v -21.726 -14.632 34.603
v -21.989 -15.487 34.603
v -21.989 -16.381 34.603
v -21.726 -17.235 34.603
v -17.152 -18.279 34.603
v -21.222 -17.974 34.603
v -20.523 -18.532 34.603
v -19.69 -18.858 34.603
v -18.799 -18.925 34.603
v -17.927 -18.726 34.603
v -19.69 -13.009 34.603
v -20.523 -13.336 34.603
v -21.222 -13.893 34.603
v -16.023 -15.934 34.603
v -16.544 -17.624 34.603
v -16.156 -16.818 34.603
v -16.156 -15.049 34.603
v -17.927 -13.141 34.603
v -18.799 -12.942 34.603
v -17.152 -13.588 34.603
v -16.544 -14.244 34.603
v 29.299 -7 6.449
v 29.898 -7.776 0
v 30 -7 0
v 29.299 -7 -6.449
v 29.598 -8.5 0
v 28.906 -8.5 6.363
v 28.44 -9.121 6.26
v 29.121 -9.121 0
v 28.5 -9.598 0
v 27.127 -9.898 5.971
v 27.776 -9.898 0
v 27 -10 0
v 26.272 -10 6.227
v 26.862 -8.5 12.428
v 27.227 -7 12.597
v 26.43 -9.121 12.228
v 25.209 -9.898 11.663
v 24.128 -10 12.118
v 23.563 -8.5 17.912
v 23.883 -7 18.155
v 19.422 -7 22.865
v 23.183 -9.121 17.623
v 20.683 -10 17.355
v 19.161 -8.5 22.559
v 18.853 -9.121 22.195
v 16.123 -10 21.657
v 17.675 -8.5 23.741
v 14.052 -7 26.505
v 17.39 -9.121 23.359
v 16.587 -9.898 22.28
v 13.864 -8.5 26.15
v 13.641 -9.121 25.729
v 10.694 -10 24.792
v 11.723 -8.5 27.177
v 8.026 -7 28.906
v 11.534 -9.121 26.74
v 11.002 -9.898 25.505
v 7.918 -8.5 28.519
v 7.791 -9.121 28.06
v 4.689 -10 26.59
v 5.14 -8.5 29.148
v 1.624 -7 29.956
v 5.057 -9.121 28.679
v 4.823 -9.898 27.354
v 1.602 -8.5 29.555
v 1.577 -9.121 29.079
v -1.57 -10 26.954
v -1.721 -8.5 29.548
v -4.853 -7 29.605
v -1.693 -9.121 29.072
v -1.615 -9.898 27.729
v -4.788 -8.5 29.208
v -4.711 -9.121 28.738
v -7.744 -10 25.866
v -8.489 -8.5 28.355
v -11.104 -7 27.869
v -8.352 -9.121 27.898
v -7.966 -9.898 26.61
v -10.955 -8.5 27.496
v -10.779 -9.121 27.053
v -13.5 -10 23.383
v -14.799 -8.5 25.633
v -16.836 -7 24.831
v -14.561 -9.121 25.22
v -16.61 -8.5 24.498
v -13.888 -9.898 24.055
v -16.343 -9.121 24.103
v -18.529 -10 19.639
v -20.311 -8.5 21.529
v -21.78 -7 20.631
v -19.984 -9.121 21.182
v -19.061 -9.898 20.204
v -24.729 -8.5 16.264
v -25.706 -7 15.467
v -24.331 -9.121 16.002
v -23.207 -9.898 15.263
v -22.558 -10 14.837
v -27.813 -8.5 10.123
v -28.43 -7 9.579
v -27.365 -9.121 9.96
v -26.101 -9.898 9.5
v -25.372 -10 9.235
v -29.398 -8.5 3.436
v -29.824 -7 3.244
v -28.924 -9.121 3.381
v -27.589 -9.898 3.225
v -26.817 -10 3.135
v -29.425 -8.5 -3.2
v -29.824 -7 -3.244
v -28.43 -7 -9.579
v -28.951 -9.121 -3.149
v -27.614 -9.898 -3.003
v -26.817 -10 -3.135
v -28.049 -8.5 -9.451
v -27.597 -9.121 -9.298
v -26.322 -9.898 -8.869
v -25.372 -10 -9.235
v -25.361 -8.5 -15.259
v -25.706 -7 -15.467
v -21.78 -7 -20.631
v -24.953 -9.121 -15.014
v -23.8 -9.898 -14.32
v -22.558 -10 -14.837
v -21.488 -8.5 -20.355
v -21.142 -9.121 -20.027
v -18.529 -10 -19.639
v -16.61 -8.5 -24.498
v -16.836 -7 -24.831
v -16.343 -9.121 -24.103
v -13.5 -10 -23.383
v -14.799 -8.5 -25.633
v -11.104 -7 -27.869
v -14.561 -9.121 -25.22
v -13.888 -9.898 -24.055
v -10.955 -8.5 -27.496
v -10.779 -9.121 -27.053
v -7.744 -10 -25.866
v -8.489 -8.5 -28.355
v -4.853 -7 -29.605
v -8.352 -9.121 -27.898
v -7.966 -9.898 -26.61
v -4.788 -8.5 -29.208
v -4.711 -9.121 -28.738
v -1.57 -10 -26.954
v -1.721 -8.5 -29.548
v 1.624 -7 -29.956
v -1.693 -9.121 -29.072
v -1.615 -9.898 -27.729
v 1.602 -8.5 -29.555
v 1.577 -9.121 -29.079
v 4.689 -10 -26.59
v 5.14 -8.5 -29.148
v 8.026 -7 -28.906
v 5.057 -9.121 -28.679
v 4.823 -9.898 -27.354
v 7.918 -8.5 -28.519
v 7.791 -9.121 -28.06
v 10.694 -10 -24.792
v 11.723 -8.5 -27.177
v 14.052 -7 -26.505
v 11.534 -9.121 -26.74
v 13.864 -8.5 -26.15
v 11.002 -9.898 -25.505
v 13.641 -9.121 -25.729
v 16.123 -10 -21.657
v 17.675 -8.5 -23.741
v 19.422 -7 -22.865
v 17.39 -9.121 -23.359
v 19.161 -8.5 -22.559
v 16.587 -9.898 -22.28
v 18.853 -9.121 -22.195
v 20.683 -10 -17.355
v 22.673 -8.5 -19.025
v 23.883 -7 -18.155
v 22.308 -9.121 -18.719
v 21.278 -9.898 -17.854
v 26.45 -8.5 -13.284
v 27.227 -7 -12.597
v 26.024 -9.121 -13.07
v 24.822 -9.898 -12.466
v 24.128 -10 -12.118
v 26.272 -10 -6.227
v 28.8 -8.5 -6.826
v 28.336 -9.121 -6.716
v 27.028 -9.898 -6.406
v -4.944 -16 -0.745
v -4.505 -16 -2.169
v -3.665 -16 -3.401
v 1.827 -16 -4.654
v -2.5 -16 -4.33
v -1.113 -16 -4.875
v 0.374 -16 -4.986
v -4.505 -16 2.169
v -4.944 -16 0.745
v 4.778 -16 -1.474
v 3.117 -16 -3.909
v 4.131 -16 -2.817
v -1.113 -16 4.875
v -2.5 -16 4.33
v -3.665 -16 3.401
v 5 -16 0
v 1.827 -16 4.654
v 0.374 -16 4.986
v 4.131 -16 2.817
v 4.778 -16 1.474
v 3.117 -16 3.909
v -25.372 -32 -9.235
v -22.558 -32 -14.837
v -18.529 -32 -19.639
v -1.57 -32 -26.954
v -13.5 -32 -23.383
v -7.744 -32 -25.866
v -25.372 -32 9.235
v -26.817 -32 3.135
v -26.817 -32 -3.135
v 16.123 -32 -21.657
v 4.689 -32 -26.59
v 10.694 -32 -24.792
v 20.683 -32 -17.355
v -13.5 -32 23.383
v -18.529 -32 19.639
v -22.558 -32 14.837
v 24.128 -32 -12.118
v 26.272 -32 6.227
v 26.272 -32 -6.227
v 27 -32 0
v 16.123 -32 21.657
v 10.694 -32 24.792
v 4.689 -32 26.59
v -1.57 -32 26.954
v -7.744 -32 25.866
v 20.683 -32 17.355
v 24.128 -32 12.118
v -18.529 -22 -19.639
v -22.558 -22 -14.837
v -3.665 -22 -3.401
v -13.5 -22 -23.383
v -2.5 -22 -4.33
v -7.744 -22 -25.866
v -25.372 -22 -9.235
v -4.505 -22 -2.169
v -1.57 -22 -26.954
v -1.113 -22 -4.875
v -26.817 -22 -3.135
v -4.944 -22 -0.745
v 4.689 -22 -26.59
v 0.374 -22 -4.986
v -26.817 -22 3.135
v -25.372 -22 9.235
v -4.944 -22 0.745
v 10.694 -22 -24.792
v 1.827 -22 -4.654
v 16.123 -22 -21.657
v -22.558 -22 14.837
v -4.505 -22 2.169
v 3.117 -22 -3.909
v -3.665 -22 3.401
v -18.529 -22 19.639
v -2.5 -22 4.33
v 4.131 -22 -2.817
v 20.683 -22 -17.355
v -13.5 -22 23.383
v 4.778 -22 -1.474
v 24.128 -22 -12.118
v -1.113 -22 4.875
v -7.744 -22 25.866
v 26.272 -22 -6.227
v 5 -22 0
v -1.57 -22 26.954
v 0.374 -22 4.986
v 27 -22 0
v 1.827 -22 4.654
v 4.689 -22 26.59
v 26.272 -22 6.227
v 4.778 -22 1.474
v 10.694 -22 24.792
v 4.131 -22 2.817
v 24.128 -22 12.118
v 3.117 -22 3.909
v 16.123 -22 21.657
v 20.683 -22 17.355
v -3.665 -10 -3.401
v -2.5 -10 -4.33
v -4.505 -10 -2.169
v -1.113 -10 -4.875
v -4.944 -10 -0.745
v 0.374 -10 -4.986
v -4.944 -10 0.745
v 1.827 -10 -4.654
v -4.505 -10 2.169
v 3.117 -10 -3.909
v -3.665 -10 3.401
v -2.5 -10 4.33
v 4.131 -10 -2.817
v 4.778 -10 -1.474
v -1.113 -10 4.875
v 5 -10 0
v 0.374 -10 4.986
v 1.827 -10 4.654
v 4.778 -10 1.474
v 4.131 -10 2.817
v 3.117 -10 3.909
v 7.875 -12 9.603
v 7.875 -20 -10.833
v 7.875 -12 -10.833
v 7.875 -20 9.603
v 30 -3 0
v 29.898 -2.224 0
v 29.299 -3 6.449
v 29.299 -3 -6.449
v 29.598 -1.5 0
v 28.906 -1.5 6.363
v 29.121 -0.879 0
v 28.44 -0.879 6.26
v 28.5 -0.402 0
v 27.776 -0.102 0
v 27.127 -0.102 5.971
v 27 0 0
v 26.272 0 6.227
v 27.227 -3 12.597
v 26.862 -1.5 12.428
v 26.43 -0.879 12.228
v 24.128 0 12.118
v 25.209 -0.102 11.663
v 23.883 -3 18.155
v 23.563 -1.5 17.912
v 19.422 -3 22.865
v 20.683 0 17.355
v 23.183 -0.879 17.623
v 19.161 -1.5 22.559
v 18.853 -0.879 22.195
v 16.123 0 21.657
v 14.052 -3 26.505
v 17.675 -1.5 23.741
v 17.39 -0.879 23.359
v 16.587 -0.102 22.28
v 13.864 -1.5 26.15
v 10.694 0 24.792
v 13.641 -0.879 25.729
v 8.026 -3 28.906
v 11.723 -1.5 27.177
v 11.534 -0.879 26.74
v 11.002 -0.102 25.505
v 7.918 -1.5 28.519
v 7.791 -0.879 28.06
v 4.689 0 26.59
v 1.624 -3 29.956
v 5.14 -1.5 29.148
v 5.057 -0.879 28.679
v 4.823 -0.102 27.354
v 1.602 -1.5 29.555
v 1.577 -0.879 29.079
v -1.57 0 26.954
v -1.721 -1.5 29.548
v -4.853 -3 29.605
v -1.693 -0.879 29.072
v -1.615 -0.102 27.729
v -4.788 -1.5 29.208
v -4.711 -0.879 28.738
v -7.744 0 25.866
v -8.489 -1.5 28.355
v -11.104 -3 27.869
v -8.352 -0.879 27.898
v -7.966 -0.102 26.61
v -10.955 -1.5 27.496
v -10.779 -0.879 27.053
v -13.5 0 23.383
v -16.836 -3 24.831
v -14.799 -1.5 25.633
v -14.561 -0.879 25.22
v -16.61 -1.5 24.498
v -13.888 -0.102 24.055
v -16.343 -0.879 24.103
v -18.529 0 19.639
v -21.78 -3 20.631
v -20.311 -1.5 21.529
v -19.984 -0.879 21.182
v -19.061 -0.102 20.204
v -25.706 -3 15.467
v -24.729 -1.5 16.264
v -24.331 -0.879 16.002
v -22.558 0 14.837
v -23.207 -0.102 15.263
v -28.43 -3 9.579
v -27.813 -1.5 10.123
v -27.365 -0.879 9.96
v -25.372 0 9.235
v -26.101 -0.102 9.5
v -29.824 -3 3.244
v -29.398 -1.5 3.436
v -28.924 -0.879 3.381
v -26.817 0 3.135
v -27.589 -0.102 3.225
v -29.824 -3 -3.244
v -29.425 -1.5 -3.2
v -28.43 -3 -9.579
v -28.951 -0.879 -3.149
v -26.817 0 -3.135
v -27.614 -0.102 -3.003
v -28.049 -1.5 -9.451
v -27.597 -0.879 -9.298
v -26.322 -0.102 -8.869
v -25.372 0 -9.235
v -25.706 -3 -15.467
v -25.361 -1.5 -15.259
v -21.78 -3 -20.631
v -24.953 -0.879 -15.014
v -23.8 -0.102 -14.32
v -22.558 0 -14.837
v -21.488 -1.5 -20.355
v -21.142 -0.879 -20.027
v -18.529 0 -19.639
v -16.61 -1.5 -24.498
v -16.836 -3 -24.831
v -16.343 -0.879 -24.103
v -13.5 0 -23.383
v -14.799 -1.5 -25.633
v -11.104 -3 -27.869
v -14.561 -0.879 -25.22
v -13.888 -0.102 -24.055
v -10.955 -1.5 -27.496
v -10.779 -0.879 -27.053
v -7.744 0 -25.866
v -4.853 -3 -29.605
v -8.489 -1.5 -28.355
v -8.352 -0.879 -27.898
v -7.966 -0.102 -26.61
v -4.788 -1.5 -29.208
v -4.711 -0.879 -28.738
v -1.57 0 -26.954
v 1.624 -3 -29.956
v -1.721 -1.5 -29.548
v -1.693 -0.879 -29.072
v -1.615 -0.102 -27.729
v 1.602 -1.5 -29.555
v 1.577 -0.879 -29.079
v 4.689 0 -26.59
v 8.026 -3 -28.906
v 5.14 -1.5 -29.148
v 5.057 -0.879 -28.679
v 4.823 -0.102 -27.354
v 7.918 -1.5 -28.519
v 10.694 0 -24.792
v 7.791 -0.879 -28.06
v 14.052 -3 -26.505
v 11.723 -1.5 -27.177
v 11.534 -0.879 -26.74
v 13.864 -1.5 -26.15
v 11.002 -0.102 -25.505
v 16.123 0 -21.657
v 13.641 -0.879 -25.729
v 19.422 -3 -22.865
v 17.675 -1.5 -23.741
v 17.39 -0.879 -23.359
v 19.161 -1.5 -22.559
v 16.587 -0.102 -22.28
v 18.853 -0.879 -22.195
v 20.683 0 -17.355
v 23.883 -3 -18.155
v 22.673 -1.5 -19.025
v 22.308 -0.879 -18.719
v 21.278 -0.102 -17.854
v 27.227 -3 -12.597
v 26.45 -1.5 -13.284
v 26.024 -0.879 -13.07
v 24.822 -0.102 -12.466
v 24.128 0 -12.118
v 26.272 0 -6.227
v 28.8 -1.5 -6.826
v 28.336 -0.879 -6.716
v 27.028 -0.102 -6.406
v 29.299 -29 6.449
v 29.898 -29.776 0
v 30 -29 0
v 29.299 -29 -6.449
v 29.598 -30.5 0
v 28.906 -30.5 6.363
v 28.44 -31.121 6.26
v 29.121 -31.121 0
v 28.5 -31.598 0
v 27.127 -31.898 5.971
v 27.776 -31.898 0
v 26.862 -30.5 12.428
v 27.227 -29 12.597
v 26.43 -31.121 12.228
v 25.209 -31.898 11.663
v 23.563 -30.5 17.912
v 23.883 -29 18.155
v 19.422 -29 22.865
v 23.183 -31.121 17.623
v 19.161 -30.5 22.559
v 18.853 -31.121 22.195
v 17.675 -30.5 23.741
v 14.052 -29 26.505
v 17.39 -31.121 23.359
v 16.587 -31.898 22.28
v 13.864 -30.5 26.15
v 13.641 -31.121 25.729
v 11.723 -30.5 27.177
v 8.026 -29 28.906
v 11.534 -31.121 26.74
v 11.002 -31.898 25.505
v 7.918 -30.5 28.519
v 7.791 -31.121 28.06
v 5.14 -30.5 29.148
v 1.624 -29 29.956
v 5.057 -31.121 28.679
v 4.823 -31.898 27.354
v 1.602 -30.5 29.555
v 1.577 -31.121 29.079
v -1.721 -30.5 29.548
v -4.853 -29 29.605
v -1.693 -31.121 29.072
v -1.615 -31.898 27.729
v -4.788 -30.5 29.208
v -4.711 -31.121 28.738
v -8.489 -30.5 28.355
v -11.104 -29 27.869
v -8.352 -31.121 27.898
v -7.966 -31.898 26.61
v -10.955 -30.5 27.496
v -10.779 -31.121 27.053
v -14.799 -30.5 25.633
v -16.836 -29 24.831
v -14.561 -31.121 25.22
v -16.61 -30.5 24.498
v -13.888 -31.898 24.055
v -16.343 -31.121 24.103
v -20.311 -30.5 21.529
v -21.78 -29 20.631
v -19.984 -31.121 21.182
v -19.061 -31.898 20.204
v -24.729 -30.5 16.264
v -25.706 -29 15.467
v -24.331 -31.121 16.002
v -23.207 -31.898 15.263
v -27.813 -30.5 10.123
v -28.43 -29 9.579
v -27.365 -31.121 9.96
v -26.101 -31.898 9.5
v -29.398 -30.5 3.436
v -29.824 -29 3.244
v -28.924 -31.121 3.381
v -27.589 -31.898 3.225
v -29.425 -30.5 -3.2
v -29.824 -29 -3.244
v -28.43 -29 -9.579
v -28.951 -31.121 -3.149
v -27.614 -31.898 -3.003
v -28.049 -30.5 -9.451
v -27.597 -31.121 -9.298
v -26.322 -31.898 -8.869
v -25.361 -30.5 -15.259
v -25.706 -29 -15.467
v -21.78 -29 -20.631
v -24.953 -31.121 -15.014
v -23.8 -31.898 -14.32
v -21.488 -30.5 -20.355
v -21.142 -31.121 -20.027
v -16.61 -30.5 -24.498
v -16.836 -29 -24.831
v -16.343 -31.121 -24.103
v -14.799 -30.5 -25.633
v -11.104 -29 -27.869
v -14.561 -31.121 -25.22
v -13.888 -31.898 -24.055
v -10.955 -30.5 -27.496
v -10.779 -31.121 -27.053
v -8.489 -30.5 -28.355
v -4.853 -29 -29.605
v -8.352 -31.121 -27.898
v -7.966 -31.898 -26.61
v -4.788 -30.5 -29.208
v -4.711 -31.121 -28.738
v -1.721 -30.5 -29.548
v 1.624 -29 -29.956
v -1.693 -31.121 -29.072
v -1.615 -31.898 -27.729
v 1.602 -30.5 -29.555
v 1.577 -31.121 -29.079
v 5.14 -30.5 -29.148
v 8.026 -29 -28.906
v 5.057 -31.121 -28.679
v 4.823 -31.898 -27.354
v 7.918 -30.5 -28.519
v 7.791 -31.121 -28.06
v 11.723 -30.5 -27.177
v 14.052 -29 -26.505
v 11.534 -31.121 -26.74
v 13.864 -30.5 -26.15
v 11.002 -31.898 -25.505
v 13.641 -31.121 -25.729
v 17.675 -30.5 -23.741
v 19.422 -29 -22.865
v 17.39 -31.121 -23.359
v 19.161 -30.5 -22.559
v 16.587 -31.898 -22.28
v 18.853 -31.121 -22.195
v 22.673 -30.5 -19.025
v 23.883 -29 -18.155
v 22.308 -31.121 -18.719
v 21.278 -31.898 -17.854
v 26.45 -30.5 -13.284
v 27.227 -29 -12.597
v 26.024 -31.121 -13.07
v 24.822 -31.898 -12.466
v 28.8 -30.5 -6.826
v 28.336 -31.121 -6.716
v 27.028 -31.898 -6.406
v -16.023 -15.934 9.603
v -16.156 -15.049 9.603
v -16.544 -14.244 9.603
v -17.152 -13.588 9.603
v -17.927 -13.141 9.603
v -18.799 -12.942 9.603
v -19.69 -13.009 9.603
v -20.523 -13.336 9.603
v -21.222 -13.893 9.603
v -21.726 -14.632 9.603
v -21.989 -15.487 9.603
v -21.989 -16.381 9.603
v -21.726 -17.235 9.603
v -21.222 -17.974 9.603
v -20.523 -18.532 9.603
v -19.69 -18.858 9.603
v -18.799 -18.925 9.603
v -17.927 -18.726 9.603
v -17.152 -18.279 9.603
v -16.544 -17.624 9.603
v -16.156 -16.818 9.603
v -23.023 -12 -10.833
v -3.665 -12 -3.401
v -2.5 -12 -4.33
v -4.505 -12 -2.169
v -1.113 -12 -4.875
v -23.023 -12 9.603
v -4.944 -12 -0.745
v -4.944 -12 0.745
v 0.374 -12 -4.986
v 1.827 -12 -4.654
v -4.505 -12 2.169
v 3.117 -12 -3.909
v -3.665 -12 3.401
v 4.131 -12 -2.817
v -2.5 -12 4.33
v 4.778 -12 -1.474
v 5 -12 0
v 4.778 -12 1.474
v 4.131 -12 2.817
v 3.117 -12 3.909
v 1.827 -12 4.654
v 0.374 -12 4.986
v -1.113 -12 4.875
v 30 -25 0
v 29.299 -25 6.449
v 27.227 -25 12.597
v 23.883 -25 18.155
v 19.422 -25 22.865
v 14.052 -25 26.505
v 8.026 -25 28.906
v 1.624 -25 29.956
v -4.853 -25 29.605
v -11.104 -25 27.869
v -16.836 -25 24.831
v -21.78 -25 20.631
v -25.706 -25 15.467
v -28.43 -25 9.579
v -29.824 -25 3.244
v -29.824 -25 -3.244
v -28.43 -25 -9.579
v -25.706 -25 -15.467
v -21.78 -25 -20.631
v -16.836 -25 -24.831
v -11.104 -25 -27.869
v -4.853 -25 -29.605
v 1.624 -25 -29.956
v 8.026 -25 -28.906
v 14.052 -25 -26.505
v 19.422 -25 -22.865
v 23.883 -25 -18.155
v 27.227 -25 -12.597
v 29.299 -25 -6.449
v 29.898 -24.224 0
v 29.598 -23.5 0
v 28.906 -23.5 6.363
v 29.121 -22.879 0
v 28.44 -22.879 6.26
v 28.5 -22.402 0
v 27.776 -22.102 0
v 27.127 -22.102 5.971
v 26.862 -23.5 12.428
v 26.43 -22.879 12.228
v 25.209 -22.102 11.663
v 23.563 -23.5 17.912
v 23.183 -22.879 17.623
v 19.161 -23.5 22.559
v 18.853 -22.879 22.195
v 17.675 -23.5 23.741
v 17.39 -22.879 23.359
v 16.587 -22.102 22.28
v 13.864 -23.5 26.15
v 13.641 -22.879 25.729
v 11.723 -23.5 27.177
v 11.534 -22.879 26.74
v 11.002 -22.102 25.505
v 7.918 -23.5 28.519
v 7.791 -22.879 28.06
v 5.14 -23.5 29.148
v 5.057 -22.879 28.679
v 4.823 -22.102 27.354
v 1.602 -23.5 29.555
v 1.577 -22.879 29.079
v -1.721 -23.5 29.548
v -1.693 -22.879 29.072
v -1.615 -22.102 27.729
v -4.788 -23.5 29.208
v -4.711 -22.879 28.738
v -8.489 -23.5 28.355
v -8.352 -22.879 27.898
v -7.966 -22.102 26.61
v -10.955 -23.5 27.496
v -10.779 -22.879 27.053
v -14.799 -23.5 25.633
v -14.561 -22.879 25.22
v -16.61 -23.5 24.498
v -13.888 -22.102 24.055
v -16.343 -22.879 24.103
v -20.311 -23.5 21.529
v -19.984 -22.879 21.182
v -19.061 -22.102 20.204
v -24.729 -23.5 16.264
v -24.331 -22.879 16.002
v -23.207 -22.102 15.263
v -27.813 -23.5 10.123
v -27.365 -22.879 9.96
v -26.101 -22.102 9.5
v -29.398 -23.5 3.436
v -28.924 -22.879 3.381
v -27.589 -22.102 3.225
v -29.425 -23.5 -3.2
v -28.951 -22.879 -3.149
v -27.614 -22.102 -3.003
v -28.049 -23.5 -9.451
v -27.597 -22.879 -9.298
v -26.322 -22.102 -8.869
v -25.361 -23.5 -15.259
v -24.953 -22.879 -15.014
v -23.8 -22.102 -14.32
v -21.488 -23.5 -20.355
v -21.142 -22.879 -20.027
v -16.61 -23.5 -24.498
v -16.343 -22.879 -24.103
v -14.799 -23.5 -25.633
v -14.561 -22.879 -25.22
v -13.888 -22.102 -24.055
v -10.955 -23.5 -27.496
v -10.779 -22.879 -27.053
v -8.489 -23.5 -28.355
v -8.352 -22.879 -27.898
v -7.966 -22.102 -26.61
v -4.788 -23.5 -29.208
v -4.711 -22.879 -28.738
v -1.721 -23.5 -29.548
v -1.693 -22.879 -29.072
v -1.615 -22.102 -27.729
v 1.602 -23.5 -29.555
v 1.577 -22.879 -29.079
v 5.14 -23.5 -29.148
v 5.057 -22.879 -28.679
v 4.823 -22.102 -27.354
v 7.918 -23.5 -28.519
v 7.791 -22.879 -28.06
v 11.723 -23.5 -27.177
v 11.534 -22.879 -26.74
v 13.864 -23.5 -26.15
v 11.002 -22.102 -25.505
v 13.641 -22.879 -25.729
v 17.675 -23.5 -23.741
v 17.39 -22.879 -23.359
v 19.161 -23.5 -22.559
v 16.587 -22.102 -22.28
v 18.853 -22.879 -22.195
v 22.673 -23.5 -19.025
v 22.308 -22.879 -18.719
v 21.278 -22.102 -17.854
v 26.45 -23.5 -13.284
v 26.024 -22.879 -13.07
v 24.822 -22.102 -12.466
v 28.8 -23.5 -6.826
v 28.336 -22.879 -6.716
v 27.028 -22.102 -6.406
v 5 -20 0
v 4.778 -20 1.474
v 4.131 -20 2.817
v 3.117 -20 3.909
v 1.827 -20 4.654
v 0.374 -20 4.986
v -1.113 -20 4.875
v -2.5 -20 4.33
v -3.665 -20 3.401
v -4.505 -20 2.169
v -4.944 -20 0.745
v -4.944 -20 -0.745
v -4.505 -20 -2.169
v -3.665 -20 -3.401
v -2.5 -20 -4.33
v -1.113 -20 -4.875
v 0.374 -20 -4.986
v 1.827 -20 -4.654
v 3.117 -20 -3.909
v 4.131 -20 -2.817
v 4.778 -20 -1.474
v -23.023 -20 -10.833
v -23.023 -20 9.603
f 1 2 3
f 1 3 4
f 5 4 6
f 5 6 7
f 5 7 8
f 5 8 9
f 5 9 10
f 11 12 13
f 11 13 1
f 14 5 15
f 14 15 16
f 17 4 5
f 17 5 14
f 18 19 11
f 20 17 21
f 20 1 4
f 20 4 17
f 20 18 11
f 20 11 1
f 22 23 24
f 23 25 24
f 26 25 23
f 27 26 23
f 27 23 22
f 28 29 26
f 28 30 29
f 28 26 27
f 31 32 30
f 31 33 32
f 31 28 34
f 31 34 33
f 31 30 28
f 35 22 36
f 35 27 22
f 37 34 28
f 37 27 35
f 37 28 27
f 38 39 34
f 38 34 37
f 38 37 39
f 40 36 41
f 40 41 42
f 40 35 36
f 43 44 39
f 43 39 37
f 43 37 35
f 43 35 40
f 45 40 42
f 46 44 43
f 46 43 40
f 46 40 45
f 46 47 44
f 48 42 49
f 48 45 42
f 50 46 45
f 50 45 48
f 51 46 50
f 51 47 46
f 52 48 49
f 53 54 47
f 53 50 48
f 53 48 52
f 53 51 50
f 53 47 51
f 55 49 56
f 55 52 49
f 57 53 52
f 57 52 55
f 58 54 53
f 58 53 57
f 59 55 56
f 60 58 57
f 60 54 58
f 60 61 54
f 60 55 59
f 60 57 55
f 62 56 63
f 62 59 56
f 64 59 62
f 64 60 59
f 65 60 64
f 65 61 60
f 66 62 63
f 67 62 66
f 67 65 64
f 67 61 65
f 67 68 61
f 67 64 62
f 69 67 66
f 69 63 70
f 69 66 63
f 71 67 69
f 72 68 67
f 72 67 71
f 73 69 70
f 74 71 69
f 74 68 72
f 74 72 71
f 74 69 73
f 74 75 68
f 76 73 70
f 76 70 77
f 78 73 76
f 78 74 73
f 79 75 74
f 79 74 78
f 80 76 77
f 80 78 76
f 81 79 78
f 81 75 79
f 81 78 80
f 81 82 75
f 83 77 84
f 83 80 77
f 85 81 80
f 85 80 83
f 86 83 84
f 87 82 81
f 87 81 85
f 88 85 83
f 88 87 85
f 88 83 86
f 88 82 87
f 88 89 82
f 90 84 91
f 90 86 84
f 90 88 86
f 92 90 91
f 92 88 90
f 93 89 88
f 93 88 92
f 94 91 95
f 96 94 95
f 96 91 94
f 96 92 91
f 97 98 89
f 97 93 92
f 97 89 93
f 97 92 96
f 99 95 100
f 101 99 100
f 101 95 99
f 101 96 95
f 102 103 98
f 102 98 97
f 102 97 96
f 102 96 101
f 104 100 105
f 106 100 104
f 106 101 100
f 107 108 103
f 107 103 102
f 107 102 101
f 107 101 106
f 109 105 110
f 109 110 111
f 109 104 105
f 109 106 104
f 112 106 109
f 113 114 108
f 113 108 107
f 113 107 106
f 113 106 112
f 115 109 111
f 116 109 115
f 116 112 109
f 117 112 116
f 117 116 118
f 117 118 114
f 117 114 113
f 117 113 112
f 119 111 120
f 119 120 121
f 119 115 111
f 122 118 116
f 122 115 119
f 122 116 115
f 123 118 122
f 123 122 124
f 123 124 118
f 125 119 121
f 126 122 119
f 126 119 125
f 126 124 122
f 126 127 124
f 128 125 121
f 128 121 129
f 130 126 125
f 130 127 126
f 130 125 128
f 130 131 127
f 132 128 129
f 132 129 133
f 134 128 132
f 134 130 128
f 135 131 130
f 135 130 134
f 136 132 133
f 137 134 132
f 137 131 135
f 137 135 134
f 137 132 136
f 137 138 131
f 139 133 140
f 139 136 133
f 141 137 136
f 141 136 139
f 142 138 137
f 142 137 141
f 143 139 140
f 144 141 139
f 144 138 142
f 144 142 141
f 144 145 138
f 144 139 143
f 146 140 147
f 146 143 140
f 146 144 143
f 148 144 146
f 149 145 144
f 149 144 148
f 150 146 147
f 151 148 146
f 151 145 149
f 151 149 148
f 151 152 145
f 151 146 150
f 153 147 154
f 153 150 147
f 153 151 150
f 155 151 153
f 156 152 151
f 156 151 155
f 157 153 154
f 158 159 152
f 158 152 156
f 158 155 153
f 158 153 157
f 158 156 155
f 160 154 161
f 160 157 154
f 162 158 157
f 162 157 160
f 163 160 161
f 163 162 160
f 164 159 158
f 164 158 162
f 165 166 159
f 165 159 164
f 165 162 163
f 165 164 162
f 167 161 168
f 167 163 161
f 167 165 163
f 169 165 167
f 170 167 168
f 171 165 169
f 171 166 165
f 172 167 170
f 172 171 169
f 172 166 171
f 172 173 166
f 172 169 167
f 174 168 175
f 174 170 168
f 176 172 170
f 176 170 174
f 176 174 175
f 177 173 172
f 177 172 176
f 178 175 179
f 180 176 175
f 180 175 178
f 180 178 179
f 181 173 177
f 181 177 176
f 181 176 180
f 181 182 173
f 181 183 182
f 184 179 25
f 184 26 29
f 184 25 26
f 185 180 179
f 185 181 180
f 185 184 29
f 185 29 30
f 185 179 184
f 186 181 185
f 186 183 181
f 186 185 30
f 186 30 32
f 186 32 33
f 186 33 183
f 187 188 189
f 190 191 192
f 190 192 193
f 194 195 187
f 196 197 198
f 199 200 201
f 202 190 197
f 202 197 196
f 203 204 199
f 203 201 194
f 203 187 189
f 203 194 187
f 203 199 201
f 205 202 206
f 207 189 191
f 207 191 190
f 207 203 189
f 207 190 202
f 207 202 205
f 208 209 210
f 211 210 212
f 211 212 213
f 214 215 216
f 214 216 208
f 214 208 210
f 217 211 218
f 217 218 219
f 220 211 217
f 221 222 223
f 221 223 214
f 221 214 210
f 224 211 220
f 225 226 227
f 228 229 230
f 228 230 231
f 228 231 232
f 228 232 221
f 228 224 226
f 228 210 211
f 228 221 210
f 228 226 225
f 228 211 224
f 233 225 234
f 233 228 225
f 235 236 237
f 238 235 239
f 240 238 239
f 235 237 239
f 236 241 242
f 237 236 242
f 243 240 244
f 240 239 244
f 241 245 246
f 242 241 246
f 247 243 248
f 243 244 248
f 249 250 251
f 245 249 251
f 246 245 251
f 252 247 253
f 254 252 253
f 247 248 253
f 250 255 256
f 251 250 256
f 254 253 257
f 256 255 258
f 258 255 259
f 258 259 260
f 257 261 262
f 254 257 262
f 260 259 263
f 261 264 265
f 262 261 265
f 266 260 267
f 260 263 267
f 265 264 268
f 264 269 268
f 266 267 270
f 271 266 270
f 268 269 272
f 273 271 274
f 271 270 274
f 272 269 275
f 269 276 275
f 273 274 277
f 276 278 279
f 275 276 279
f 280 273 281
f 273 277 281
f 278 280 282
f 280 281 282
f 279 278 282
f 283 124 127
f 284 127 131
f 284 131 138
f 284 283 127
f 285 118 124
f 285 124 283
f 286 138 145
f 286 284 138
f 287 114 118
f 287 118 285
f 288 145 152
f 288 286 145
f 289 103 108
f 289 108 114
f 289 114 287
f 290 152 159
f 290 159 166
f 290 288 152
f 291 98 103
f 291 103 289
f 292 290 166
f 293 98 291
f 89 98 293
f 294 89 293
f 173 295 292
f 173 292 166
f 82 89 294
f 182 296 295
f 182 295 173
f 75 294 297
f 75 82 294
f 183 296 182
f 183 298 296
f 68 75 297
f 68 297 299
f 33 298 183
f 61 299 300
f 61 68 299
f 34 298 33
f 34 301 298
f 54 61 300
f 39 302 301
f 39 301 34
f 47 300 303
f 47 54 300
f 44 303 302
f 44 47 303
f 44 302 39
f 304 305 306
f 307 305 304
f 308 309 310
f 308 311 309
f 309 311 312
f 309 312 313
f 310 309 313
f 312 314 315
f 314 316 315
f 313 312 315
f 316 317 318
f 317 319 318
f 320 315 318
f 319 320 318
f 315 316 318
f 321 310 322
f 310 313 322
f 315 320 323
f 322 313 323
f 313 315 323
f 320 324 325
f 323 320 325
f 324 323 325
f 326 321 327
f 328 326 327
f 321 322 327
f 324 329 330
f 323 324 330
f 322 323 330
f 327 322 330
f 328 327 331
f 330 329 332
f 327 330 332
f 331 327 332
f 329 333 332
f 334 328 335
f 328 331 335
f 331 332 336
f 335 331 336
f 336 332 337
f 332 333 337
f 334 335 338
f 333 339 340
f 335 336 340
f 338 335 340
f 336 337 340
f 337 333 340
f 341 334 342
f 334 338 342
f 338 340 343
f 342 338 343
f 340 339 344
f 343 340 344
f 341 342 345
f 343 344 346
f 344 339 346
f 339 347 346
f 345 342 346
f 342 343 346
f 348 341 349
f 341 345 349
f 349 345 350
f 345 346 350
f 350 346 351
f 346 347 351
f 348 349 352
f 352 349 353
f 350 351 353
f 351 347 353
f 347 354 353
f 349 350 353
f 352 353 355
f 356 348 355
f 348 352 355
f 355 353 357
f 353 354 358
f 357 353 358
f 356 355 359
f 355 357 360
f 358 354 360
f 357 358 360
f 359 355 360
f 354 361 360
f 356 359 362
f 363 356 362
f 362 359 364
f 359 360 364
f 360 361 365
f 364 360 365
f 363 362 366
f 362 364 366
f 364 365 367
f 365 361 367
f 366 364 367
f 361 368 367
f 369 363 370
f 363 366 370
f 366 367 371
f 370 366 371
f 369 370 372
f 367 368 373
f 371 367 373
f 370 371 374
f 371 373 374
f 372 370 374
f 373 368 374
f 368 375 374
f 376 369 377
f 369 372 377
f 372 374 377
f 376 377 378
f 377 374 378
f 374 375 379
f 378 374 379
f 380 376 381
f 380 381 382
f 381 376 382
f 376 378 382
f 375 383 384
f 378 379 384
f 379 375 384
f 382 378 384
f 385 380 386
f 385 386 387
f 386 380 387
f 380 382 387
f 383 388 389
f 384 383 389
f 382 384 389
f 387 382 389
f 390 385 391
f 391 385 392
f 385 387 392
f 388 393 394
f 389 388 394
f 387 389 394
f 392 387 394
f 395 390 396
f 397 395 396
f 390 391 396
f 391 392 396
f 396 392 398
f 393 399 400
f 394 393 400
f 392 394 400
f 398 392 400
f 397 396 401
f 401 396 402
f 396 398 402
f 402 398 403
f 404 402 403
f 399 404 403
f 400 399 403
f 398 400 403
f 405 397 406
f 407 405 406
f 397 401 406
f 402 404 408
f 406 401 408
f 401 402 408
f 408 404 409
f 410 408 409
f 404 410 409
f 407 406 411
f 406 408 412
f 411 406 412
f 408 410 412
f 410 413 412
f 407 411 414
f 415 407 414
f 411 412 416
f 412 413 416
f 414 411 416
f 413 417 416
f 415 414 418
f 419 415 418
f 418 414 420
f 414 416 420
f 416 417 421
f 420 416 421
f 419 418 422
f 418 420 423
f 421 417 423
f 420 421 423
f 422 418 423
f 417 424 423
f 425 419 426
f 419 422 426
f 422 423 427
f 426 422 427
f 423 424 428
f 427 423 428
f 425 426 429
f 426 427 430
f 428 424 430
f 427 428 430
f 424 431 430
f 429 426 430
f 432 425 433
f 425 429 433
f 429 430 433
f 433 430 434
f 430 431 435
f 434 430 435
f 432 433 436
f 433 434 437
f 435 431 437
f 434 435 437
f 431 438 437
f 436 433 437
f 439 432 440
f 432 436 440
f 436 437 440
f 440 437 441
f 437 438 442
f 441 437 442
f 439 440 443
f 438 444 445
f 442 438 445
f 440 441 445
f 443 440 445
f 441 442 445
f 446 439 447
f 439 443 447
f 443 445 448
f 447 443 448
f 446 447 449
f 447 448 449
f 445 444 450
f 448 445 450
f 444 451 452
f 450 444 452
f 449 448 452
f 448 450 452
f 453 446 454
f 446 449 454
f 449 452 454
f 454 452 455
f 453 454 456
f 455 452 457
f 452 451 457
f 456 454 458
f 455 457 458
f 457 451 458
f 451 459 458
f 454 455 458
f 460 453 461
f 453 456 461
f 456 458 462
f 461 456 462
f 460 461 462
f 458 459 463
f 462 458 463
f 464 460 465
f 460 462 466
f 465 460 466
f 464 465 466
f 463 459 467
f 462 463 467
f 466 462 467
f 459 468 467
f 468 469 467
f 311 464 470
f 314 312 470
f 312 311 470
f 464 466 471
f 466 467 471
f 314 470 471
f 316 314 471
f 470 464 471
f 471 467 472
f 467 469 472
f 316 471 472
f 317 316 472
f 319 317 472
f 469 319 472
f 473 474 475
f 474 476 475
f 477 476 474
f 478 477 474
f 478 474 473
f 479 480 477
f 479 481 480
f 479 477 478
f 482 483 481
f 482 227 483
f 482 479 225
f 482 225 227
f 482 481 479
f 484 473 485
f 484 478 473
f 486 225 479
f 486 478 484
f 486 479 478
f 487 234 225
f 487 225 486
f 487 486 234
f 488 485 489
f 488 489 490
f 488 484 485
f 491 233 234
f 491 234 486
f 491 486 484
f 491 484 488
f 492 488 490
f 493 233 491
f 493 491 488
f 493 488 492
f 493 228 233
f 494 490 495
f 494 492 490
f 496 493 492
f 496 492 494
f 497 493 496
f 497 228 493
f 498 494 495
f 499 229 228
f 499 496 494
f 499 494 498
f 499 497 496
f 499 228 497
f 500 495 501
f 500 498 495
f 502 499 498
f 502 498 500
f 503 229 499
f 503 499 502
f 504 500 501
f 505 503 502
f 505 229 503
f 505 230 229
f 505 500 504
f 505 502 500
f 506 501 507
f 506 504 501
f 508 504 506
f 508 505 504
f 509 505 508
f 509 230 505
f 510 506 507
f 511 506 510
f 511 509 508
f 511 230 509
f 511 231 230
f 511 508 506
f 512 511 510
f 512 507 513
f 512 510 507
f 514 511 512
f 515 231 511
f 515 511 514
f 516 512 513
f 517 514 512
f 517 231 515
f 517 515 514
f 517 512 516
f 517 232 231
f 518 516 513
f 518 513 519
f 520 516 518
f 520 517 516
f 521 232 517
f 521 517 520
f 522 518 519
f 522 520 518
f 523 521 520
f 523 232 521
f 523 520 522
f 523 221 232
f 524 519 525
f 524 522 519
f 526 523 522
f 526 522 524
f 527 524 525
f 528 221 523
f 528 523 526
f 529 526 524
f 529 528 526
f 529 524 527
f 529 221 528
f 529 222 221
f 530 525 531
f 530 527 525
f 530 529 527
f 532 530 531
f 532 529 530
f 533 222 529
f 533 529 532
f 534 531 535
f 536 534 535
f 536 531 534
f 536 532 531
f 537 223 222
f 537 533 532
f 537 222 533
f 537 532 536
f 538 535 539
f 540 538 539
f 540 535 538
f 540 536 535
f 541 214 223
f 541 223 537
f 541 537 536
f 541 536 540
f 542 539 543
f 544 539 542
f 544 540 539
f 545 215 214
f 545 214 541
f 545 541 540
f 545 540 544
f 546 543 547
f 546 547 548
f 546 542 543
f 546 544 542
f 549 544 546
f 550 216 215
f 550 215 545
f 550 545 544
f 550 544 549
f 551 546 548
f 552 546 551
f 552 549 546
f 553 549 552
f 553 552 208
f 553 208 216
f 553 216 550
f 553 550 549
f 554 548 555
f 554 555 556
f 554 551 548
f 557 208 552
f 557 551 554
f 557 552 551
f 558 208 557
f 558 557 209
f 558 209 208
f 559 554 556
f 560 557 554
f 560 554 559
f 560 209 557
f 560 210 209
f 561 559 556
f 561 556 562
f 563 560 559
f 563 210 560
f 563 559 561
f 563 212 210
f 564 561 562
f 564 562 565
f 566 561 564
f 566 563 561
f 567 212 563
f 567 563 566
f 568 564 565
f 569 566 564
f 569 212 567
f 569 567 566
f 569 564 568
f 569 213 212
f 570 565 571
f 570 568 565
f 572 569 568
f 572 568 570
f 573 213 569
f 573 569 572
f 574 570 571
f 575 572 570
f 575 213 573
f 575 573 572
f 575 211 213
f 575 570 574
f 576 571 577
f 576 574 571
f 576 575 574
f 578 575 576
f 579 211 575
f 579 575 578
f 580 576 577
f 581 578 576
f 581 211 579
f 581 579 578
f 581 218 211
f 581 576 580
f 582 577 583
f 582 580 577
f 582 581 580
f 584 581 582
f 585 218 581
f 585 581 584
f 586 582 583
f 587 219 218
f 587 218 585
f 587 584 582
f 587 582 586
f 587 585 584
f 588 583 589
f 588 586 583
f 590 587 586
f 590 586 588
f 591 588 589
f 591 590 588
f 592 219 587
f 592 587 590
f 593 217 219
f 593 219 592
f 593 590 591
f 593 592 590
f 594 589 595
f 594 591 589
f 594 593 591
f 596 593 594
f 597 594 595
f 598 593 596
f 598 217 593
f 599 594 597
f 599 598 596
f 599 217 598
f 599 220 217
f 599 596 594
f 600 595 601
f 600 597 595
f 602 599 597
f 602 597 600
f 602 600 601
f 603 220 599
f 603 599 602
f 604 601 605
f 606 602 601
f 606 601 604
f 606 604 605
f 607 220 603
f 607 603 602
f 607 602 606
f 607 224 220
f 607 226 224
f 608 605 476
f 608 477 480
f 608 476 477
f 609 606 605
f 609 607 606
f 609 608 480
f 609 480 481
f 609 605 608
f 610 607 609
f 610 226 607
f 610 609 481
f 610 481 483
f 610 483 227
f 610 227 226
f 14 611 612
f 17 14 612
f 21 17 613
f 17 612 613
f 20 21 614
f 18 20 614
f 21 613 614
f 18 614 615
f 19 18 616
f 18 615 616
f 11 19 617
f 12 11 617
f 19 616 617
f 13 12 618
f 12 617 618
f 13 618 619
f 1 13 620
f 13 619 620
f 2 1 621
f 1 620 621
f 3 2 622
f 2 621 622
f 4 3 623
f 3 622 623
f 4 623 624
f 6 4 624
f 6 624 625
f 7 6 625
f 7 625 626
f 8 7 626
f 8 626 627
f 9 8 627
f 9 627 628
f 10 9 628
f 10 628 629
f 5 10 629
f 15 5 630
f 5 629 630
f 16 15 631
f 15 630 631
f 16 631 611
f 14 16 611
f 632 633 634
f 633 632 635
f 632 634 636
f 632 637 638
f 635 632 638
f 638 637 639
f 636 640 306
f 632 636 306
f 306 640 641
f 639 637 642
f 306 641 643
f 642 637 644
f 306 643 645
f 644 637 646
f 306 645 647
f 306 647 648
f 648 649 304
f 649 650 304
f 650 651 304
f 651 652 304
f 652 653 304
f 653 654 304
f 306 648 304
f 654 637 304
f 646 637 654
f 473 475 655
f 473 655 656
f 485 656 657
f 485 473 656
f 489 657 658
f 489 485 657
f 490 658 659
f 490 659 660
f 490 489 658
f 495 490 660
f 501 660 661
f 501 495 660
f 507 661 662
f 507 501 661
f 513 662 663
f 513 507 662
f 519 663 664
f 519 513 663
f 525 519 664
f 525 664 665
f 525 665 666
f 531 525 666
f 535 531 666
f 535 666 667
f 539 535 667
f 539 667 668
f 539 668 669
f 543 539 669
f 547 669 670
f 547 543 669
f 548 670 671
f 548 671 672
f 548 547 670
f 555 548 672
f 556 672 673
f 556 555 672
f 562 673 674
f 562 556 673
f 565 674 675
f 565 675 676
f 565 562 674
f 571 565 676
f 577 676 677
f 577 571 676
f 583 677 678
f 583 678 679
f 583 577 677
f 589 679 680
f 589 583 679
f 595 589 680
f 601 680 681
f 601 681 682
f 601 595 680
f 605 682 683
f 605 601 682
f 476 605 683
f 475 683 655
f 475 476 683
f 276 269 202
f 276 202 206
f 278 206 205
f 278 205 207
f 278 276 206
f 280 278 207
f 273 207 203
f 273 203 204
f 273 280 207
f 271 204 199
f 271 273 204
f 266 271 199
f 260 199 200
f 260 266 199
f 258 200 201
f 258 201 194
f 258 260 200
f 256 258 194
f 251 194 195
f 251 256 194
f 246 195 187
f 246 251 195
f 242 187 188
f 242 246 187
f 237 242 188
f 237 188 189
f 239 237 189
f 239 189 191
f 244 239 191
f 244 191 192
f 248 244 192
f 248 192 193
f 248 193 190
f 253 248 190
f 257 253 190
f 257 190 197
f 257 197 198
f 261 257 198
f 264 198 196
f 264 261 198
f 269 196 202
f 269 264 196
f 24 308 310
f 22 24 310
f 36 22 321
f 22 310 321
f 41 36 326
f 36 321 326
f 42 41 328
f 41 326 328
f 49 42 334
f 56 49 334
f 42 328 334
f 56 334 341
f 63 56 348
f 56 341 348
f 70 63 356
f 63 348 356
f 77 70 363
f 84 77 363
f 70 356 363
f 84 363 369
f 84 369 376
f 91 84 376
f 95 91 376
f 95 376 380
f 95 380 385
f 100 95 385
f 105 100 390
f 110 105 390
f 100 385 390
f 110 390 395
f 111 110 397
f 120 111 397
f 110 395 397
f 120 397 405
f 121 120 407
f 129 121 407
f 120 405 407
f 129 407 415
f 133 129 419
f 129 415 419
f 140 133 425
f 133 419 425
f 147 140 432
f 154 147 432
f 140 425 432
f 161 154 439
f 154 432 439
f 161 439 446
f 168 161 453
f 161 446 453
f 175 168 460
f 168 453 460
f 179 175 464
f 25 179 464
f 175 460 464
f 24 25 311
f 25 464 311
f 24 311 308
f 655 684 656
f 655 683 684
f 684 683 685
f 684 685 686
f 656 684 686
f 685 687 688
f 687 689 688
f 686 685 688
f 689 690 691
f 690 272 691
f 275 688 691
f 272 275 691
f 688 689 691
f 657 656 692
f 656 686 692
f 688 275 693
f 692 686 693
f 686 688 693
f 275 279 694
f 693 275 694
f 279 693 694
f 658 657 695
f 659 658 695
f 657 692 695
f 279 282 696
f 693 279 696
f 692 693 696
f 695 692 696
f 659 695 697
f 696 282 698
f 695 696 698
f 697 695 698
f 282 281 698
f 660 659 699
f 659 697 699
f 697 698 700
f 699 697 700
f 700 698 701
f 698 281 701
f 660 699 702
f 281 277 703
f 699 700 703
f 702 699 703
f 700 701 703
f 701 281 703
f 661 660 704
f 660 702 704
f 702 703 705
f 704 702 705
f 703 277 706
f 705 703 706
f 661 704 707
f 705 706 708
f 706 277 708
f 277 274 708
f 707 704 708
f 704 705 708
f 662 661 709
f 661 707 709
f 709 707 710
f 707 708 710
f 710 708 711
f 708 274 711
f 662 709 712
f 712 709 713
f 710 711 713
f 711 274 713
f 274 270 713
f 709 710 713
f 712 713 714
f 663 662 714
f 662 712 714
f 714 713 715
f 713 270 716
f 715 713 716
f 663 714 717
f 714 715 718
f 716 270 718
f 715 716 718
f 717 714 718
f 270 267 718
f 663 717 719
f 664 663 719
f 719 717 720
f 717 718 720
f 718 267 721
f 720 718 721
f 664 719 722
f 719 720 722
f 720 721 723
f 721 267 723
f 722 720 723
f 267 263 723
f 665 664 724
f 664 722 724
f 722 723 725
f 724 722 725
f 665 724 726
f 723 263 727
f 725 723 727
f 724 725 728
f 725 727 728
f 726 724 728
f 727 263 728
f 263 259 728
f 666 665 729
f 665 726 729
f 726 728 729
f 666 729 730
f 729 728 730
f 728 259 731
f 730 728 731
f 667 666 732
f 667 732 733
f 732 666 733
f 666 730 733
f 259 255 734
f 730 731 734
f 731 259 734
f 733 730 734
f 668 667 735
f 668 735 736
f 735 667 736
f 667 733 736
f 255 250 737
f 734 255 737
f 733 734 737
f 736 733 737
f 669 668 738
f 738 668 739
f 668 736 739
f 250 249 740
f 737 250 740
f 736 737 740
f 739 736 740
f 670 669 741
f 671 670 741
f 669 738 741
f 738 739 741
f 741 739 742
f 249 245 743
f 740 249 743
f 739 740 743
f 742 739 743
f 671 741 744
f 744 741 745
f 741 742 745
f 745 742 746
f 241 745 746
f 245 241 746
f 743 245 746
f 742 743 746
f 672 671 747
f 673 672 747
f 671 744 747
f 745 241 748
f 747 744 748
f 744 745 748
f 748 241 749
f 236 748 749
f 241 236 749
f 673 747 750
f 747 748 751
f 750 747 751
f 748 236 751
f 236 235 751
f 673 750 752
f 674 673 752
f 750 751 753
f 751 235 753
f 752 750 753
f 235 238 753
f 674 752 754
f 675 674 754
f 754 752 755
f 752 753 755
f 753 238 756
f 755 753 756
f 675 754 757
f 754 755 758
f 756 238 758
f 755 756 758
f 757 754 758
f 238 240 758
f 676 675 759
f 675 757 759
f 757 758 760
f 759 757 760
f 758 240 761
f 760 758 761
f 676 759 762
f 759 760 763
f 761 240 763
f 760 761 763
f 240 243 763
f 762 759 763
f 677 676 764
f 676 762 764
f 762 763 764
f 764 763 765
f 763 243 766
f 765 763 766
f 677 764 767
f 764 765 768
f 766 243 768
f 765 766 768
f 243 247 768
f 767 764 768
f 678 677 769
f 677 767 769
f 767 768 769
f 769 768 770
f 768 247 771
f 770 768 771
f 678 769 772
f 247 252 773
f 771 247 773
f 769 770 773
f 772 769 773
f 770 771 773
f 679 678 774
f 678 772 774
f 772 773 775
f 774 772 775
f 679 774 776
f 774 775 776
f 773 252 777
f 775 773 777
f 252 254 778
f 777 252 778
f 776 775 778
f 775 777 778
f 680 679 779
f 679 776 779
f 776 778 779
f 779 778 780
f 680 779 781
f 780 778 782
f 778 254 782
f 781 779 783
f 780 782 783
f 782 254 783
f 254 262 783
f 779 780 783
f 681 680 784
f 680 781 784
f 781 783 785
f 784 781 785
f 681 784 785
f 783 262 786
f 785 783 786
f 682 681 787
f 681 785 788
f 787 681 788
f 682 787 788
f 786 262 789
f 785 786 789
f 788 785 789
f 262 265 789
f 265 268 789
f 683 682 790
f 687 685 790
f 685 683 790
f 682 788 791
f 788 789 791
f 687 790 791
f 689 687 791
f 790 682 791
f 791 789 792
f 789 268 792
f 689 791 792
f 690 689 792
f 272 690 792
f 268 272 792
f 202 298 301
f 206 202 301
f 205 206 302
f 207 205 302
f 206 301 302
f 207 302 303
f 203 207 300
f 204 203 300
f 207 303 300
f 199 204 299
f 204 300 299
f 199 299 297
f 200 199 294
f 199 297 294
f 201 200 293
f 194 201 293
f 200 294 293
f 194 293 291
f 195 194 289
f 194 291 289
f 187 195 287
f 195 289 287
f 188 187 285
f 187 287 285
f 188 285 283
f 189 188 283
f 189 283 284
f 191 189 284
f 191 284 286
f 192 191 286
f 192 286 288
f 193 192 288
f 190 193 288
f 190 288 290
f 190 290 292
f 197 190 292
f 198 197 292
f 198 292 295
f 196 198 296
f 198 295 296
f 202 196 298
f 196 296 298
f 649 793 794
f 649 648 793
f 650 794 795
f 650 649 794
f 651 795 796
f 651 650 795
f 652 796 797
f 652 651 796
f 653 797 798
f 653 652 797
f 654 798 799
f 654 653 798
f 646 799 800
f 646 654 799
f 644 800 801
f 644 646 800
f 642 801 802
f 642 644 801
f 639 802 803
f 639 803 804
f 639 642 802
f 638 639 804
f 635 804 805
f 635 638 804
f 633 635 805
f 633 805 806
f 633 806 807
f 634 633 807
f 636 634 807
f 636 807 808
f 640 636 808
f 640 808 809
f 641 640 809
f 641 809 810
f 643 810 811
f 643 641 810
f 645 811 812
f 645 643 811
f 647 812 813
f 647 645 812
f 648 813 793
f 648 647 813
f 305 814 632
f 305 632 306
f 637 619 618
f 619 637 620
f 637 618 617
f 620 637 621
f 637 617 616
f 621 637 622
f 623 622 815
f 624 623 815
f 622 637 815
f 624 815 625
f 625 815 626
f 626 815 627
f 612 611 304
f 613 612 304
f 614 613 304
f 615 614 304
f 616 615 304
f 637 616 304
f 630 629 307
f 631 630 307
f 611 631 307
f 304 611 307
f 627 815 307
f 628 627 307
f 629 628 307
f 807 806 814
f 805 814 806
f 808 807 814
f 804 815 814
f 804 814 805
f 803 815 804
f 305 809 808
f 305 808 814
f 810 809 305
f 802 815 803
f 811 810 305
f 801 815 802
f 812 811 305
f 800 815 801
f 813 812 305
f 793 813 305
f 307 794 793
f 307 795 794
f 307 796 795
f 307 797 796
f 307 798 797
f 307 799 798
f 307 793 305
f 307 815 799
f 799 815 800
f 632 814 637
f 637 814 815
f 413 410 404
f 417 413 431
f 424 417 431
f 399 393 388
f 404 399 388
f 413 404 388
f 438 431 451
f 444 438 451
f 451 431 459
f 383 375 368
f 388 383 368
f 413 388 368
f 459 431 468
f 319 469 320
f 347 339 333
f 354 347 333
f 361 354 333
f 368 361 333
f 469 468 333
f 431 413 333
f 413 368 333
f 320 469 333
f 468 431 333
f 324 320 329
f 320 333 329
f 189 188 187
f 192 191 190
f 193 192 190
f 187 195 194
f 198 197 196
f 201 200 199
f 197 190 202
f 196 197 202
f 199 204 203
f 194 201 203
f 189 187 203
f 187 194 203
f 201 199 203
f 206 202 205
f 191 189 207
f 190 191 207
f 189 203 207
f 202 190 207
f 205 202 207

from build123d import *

# Parameters (mm, degrees)
F0_R     = 30
F1_DEPTH = 10
F2_R     = 3
F3_R     = 5
F4_DEPTH = 6
F6_W     = 30.898128
F6_H     = 20.435788
F6_R     = 5
F7_DEPTH = 4
F8_R     = 3
F9_DEPTH = 25


with BuildPart() as f1:
    # F0 (on Front) → F1 (new body)
    with BuildSketch(Plane.XZ):
        Circle(F0_R)
    extrude(amount=F1_DEPTH)

    # F2
    f2_edges = [f1.edges().sort_by_distance(p)[0] for p in [
        (-30, -10, 0),
        (-30, 0, 0),
    ]]
    fillet(f2_edges, radius=F2_R)

    # F3 (on face) → F4 (join)
    with BuildSketch(Plane.XZ.offset(10)):
        Circle(F3_R)
    extrude(amount=F4_DEPTH)


with BuildPart() as f5_1:
    # F5: instance of F1
    add(f1.part.mirror(Plane.XZ.offset(16)))


with BuildPart() as f7:
    # F6 (on face) → F7 (new body, symmetric)
    with BuildSketch(Plane.XZ.offset(16)):
        with Locations((-7.573711, -0.615)):
            Rectangle(F6_W, F6_H)
        Circle(F6_R, mode=Mode.SUBTRACT)
    extrude(amount=F7_DEPTH, both=True)

    # F8 (on face) → F9 (join)
    with BuildSketch(Plane.XY.offset(9.602894)):
        with Locations((-19.022775, -15.933672)):
            Circle(F8_R)
    extrude(amount=F9_DEPTH)


solid = Compound([f1.part, f5_1.part, f7.part])
